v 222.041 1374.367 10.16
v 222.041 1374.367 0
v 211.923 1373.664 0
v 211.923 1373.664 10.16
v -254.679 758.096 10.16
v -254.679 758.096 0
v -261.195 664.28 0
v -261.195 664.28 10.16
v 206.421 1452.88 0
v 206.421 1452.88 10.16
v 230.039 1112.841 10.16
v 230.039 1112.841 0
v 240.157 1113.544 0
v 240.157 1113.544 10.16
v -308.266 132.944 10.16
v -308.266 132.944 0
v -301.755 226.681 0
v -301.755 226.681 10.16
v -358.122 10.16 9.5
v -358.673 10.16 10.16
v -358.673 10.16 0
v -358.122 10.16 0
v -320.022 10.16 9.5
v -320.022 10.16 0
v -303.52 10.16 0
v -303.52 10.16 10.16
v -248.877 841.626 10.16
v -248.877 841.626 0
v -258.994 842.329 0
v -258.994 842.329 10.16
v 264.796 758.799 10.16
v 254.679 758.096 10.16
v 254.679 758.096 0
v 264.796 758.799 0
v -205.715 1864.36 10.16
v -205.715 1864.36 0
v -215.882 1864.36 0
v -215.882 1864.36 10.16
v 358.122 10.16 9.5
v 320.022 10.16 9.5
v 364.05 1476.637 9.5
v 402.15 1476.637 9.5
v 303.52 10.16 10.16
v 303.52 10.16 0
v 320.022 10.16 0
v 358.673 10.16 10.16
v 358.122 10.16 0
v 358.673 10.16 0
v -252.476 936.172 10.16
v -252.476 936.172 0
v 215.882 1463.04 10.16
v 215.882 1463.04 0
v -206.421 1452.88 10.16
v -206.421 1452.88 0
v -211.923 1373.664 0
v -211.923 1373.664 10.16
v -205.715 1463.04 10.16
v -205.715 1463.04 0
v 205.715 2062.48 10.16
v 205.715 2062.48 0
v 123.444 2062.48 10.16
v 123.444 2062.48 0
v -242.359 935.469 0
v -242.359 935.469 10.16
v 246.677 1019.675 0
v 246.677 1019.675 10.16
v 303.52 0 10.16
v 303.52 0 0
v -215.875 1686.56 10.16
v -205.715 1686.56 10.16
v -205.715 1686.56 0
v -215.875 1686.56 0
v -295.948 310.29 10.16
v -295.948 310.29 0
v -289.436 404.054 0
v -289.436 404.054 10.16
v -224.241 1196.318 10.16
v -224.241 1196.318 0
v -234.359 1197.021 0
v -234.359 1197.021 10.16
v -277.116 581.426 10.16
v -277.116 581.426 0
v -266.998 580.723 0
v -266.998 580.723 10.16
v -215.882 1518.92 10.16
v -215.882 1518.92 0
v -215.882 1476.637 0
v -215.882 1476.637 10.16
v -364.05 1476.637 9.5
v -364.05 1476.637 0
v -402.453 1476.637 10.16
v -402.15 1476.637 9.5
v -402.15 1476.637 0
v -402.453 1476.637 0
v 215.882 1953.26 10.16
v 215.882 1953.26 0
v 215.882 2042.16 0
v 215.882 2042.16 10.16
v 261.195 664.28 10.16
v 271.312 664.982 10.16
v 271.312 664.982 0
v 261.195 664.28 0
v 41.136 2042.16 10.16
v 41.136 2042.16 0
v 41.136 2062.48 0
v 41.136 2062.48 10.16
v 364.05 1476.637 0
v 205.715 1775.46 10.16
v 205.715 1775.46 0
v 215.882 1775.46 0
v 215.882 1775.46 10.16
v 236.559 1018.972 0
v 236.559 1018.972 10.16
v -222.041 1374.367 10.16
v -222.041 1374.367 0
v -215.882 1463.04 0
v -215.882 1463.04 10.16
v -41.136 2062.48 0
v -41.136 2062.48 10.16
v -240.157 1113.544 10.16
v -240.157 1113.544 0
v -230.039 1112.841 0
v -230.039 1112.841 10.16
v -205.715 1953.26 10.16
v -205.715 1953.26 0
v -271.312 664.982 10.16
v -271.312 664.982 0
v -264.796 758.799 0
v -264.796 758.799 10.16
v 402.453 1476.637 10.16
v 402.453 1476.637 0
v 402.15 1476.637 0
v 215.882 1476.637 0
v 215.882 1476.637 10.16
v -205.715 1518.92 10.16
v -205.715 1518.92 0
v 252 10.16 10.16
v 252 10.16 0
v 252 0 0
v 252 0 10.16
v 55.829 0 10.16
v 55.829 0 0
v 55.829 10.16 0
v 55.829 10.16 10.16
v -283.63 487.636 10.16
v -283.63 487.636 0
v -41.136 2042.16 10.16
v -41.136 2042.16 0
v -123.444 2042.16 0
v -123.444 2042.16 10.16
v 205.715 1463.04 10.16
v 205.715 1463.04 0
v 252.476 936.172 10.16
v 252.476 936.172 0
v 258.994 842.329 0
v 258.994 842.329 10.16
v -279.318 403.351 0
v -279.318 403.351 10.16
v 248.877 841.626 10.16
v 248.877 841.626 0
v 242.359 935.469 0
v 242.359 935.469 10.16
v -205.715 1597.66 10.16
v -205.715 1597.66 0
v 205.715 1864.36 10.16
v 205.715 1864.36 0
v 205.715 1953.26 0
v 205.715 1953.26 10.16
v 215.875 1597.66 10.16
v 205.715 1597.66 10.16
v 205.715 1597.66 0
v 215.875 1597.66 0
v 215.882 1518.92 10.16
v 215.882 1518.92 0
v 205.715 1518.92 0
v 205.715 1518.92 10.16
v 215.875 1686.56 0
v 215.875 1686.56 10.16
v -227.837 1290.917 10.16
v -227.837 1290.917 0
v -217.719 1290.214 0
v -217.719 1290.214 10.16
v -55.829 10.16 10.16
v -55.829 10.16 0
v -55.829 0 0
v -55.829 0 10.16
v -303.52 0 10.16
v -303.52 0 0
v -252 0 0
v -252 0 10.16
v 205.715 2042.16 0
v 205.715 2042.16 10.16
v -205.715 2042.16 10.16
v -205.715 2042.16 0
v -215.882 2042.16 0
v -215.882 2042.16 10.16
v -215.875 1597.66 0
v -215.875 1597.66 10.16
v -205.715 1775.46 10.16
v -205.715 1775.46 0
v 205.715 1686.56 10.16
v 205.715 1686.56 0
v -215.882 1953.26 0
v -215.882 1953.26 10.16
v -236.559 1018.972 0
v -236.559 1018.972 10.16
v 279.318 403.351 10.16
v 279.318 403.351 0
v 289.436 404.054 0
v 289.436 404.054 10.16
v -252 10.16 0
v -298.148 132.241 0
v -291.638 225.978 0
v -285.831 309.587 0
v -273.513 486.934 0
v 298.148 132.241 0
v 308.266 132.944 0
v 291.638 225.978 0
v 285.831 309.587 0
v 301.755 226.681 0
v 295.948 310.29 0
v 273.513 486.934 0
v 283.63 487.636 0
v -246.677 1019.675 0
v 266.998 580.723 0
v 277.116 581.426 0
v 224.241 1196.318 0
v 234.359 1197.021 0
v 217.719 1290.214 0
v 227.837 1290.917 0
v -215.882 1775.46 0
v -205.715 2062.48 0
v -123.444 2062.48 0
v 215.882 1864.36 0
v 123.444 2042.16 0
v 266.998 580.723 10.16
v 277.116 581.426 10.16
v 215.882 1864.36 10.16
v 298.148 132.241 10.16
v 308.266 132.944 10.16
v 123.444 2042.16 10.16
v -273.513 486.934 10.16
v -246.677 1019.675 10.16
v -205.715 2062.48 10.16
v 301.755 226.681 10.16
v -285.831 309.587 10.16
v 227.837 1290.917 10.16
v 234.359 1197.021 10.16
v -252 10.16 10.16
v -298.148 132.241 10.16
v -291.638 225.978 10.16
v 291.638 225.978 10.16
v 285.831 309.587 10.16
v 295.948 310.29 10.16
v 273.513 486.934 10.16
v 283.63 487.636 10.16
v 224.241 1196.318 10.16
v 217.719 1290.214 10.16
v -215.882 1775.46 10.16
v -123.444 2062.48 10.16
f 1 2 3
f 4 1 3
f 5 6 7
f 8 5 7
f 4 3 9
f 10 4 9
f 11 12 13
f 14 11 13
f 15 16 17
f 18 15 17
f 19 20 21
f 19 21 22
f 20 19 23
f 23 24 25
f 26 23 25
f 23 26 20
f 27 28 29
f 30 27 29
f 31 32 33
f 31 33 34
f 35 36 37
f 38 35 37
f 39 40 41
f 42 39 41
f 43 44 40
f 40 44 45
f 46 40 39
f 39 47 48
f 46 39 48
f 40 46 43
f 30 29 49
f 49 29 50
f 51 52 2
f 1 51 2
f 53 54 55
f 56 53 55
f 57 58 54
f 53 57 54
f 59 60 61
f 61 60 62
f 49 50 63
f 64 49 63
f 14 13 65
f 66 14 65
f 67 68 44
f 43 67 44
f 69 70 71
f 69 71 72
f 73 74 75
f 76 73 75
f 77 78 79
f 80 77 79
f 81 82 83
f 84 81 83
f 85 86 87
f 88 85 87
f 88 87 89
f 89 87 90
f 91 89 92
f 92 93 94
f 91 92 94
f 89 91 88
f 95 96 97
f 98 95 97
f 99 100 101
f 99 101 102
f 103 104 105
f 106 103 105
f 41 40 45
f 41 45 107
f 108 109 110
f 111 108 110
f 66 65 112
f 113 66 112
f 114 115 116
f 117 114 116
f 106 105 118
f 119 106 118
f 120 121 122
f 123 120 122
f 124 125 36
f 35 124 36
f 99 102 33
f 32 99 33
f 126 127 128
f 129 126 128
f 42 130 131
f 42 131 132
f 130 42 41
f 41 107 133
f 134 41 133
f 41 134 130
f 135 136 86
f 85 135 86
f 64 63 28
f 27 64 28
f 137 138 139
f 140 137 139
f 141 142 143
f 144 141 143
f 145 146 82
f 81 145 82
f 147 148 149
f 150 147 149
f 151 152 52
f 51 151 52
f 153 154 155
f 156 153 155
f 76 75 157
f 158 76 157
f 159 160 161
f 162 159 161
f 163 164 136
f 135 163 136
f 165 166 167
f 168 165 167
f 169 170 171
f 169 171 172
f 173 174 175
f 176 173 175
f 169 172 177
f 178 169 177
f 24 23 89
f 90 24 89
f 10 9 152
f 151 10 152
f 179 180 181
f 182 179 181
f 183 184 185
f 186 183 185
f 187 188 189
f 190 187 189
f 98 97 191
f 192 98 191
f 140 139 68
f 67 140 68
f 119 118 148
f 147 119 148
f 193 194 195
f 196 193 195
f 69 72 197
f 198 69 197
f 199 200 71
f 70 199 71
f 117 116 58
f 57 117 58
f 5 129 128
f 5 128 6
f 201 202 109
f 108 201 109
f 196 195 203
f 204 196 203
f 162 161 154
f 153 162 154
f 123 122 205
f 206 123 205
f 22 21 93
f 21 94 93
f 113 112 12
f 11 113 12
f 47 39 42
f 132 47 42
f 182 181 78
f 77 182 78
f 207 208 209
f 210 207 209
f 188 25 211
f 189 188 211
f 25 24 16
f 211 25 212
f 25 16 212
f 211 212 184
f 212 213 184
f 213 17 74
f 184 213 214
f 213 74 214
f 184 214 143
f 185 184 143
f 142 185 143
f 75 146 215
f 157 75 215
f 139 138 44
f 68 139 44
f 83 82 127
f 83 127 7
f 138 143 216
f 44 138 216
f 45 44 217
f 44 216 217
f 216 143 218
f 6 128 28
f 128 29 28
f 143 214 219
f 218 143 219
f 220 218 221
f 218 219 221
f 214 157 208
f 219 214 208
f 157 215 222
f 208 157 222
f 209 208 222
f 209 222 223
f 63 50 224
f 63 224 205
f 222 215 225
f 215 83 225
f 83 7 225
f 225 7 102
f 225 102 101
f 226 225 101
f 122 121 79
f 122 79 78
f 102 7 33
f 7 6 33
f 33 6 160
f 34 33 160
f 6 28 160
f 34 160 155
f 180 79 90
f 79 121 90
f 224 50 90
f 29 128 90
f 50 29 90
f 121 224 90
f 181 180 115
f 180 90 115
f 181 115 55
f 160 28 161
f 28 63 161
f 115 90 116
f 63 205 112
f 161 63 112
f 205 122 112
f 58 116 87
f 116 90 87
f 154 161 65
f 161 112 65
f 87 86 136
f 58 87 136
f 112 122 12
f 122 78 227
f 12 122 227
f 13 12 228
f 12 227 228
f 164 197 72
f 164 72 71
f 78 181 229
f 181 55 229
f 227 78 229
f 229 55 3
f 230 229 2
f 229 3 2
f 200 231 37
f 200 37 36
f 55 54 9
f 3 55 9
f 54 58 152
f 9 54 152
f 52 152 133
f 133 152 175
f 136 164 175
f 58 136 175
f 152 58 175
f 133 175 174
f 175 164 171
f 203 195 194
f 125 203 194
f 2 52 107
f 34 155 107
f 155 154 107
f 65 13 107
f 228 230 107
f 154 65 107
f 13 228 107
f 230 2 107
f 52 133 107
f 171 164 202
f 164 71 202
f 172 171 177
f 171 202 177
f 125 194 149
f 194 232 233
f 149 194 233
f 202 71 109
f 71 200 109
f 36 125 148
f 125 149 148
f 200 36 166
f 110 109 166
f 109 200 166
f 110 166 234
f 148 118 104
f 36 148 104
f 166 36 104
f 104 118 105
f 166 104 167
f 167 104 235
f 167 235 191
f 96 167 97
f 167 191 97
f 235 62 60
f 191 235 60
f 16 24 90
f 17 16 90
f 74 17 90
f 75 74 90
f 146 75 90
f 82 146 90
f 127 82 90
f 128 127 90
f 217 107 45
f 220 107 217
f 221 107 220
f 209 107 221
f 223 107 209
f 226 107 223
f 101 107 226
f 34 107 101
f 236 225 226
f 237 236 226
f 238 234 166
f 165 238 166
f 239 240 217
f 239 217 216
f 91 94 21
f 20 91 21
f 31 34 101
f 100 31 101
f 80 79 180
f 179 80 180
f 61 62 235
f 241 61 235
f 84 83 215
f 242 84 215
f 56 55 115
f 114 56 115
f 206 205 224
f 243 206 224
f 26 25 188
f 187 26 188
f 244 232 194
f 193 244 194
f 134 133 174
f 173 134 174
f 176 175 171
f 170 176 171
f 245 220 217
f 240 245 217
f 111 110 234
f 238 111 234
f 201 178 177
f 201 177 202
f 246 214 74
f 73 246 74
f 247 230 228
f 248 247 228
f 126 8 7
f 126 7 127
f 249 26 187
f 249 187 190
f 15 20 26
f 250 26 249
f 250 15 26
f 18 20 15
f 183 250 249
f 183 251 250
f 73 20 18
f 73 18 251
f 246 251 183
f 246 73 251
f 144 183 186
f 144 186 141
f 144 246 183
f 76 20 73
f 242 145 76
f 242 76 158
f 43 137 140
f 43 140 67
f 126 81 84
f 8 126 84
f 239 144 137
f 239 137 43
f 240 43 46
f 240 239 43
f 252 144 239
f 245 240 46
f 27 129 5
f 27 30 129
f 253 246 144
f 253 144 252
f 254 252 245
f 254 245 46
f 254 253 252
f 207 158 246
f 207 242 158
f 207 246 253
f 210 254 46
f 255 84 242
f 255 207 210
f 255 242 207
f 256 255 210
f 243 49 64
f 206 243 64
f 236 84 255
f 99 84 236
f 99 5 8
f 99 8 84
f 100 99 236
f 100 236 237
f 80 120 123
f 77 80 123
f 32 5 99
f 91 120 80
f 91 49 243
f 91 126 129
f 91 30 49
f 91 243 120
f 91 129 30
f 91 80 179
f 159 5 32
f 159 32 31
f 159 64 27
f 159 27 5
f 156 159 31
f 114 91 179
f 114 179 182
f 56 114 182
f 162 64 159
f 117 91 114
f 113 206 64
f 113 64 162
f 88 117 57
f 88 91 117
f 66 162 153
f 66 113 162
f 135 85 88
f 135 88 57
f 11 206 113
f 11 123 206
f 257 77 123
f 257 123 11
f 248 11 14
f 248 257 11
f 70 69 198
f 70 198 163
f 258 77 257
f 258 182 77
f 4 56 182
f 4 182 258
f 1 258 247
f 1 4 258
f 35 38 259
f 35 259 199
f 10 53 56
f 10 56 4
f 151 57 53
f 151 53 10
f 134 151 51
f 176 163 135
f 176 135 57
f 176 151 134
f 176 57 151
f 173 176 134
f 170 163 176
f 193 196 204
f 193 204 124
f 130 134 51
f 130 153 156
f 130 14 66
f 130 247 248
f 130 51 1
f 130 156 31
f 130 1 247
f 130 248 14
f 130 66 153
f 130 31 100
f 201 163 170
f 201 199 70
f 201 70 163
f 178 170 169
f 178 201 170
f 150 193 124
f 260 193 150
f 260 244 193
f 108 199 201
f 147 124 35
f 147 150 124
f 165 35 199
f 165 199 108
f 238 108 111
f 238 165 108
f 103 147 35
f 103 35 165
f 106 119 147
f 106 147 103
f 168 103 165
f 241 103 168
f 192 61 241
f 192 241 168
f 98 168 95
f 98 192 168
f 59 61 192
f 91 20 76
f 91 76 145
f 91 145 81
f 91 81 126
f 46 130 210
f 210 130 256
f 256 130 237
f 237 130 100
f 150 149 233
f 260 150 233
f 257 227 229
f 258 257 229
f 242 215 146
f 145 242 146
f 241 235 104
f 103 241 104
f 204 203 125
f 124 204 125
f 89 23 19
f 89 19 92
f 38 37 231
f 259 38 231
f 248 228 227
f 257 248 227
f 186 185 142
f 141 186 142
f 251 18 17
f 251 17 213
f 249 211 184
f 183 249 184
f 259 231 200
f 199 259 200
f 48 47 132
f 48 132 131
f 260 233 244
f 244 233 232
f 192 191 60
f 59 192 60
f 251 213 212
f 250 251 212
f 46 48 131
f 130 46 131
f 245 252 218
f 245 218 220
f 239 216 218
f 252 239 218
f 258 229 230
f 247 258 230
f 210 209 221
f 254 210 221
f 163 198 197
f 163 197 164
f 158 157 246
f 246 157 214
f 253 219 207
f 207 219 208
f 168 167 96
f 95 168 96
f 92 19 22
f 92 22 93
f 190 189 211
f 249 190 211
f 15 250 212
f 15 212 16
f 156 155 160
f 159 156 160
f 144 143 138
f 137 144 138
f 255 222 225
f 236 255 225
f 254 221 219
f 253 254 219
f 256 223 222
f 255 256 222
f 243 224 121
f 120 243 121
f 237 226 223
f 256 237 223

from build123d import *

# Parameters (mm, degrees)
BOSS_EXTRUDE1_DEPTH = 10.16
CUT_LOFT1_START     = 319.572758977
CUT_LOFT1_OUTLINE_W = 1472
CUT_LOFT1_OUTLINE_H = 11.5
CUT_LOFT1_DEPTH     = 38.082840263


# Read off the part's stored shape, not the designer's step: Cut-Loft1
with BuildPart() as part:
    # Sketch1 → Boss-Extrude1 (new body)
    # profile 1 of 2: a face of its own
    with BuildSketch(Plane.XY):
        Polygon((205.715298803, 2062.48), (123.444, 2062.48), (123.444, 2042.16), (41.135649402, 2042.16), (41.135649402, 2062.48), (-41.135649402, 2062.48), (-41.135649402, 2042.16), (-123.444, 2042.16), (-123.444, 2062.48), (-205.715298803, 2062.48), (-205.715298803, 2042.16), (-215.881789204, 2042.16), (-215.881789204, 1953.26), (-205.715298803, 1953.26), (-205.715298803, 1864.36), (-215.881789204, 1864.36), (-215.881789204, 1775.46), (-205.715298803, 1775.46), (-205.715298803, 1686.56), (-215.875298803, 1686.56), (-215.875298803, 1597.66), (-205.715298803, 1597.66), (-205.715298803, 1518.92), (205.715298803, 1518.92), (205.715298803, 1597.66), (215.875298803, 1597.66), (215.875298803, 1686.56), (205.715298803, 1686.56), (205.715298803, 1775.46), (215.881789204, 1775.46), (215.881789204, 1864.36), (205.715298803, 1864.36), (205.715298803, 1953.26), (215.881789204, 1953.26), (215.881789204, 2042.16), (205.715298803, 2042.16), align=None)
    # profile 2 of 2: a face of its own
    with BuildSketch(Plane.XY):
        Polygon((215.881789204, 1518.92), (205.715298803, 1518.92), (-205.715298803, 1518.92), (-215.881789204, 1518.92), (-215.881789204, 1476.636861244), (-402.453189401, 1476.636861244), (-358.672996954, 10.16), (-303.52, 10.16), (-303.52, 0), (-252, 0), (-252, 10.16), (-55.8292, 10.16), (-55.8292, 0), (55.8292, 0), (55.8292, 10.16), (252, 10.16), (252, 0), (303.52, 0), (303.52, 10.16), (358.672996954, 10.16), (402.453189401, 1476.636861244), (215.881789204, 1476.636861244), align=None)
        Polygon((-308.266124544, 132.94397688), (-301.755453134, 226.680843836), (-291.63777305, 225.978101227), (-298.14844446, 132.241234271), align=None, mode=Mode.SUBTRACT)
        Polygon((-289.435698895, 404.053512688), (-279.318018811, 403.350770078), (-285.830533081, 309.587370692), (-295.948213166, 310.290113301), align=None, mode=Mode.SUBTRACT)
        Polygon((-283.630301787, 487.636249721), (-277.115944656, 581.426181539), (-266.998264572, 580.72343893), (-273.512621703, 486.933507112), align=None, mode=Mode.SUBTRACT)
        Polygon((-264.796190418, 758.798850391), (-254.678510334, 758.096107781), (-261.194710324, 664.279643533), (-271.312390408, 664.982386142), align=None, mode=Mode.SUBTRACT)
        Polygon((-252.476436179, 936.171519242), (-242.358756095, 935.468776633), (-248.876798945, 841.625779953), (-258.99447903, 842.328522563), align=None, mode=Mode.SUBTRACT)
        Polygon((301.755453134, 226.680843836), (308.266124544, 132.94397688), (298.14844446, 132.241234271), (291.63777305, 225.978101227), align=None, mode=Mode.SUBTRACT)
        Polygon((279.318018811, 403.350770078), (289.435698895, 404.053512688), (295.948213166, 310.290113301), (285.830533081, 309.587370692), align=None, mode=Mode.SUBTRACT)
        Polygon((277.115944656, 581.426181539), (283.630301787, 487.636249721), (273.512621703, 486.933507112), (266.998264572, 580.72343893), align=None, mode=Mode.SUBTRACT)
        Polygon((254.678510334, 758.096107781), (264.796190418, 758.798850391), (271.312390408, 664.982386142), (261.194710324, 664.279643533), align=None, mode=Mode.SUBTRACT)
        Polygon((242.358756095, 935.468776633), (252.476436179, 936.171519242), (258.99447903, 842.328522563), (248.876798945, 841.625779953), align=None, mode=Mode.SUBTRACT)
        Polygon((-240.15668194, 1113.544188093), (-230.039001856, 1112.841445484), (-236.558887567, 1018.971916374), (-246.676567651, 1019.674658983), align=None, mode=Mode.SUBTRACT)
        Polygon((-227.836927701, 1290.916856945), (-217.719247617, 1290.214114336), (-224.240976188, 1196.318052795), (-234.358656272, 1197.020795404), align=None, mode=Mode.SUBTRACT)
        Polygon((-206.420980822, 1452.880000035), (-211.92306481, 1373.664189215), (-222.040744894, 1374.366931824), (-215.881789204, 1463.040000035), (-205.715298803, 1463.040000035), align=None, mode=Mode.SUBTRACT)
        Polygon((230.039001856, 1112.841445484), (240.15668194, 1113.544188093), (246.676567651, 1019.674658983), (236.558887567, 1018.971916374), align=None, mode=Mode.SUBTRACT)
        Polygon((217.719247617, 1290.214114336), (227.836927701, 1290.916856945), (234.358656272, 1197.020795404), (224.240976188, 1196.318052795), align=None, mode=Mode.SUBTRACT)
        Polygon((205.715298803, 1463.040000035), (215.881789204, 1463.040000035), (222.040744894, 1374.366931824), (211.92306481, 1373.664189215), (206.420980822, 1452.880000035), align=None, mode=Mode.SUBTRACT)
    extrude(amount=BOSS_EXTRUDE1_DEPTH)

    # Cut-Loft1 outline → Cut-Loft1 (cut)
    with BuildSketch(Plane(origin=(0, 0, 0), x_dir=(0.030009511302642098, 0.9995496131915498, 0), z_dir=(0.9995496131915498, -0.030009511302642095, 0)).offset(CUT_LOFT1_START)):
        with Locations((754, 3.75)):
            Rectangle(CUT_LOFT1_OUTLINE_W, CUT_LOFT1_OUTLINE_H)
    cut_loft1 = extrude(amount=CUT_LOFT1_DEPTH, mode=Mode.SUBTRACT)

    # Mirror1: Cut-Loft1 across plane
    add(cut_loft1.mirror(Plane(origin=(0, 0, 0), x_dir=(0, 0, 1), z_dir=(1, 0, 0))), mode=Mode.SUBTRACT)


solid = part.part
